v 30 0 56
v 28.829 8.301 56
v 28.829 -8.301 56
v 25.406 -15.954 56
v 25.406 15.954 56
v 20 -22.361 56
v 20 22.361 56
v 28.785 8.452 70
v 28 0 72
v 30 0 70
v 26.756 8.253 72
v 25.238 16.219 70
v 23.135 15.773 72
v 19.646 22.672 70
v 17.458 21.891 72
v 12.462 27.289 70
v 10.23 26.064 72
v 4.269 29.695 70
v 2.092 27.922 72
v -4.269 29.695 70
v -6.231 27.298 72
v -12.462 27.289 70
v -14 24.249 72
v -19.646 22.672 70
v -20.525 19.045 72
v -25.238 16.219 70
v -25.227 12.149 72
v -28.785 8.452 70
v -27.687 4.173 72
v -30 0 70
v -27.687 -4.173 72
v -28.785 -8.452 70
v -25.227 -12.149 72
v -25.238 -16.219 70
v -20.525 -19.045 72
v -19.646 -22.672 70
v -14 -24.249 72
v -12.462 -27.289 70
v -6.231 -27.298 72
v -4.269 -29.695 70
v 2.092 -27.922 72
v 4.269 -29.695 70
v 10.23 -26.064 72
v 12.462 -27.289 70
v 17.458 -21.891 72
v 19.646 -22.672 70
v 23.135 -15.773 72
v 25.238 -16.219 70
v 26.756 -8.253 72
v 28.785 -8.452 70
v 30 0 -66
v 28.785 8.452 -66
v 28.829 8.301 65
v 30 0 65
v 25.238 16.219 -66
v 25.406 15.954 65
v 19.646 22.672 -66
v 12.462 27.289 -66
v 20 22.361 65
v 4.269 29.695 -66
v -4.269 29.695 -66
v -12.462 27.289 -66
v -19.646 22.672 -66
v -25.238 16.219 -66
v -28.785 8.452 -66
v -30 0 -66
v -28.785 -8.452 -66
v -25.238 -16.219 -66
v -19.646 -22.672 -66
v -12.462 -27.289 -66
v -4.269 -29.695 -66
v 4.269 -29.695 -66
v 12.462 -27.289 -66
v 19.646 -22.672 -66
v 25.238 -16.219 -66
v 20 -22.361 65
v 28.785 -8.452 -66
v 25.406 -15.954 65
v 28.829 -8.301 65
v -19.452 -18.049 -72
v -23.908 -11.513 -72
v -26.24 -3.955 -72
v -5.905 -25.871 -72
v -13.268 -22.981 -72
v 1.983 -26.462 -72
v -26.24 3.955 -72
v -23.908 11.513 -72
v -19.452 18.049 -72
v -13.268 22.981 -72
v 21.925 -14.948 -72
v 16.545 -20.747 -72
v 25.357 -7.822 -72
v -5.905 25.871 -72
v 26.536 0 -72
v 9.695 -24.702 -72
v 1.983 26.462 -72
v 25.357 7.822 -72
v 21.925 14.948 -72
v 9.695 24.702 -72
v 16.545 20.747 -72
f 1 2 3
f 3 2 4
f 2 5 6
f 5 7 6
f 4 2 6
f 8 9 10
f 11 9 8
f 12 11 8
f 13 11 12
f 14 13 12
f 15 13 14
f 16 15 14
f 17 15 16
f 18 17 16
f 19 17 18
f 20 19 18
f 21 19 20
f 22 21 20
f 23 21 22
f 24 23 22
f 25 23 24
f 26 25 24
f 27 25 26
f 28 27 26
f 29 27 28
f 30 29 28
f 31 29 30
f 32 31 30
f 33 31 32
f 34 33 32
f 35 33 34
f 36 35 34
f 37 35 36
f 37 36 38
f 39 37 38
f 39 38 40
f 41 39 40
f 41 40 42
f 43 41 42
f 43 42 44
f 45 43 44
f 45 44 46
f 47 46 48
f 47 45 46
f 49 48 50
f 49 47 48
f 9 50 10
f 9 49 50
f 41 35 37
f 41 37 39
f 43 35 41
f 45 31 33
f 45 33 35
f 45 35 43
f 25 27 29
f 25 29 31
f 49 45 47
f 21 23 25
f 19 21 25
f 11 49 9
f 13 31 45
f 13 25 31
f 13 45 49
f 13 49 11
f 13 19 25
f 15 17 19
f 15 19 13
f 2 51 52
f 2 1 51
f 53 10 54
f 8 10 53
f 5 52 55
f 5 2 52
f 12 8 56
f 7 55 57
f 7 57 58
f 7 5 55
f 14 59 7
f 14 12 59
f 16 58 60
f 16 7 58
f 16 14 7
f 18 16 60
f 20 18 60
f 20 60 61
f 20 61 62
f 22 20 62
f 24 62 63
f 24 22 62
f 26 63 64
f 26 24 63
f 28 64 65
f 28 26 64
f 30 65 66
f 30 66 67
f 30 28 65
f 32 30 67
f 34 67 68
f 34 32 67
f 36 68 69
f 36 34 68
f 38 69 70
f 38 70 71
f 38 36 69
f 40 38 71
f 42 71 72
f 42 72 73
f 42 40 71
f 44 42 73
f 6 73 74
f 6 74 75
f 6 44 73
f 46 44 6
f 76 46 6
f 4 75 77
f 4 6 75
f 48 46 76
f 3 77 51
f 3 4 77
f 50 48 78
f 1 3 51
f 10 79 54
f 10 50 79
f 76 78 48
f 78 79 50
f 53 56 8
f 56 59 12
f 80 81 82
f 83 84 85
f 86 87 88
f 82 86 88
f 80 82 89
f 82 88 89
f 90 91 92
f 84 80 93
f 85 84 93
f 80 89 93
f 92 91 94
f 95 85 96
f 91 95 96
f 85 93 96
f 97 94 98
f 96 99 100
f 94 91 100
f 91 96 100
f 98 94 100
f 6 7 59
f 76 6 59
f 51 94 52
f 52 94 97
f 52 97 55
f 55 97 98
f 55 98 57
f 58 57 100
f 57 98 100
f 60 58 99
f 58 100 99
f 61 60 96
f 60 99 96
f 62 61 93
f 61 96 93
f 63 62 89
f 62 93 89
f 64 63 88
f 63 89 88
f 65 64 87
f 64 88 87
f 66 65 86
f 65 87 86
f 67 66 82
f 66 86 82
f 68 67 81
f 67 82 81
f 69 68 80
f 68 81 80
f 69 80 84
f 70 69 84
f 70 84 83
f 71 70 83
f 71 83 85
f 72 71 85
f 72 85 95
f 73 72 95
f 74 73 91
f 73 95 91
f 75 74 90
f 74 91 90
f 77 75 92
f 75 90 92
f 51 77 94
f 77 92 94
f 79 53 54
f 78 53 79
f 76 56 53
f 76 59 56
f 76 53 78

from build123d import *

# Parameters (mm, degrees)
F0_R     = 30
F1_DEPTH = 72
F2_SIZE  = 2
F3_SIZE2 = 3.464102
F3_SIZE  = 6
F4_W     = 15
F4_H     = 9
F5_DEPTH = 50


with BuildPart() as f1:
    # F0 (on Top) → F1 (new body, symmetric)
    with BuildSketch(Plane.XY):
        Circle(F0_R)
    extrude(amount=F1_DEPTH, both=True)

    # F2
    f2_edges = [f1.edges().sort_by_distance(p)[0] for p in [
        (-30, 0, 72),
    ]]
    chamfer(f2_edges, length=F2_SIZE)

    # F3
    f3_edges = [f1.edges().sort_by_distance(p)[0] for p in [
        (-30, 0, -72),
    ]]
    chamfer(f3_edges, length=F3_SIZE, length2=F3_SIZE2)

    # F4 (on Front) → F5 (cut, symmetric)
    with BuildSketch(Plane.XZ):
        with Locations((27.5, 60.5)):
            Rectangle(F4_W, F4_H)
    extrude(amount=F5_DEPTH, both=True, mode=Mode.SUBTRACT)


solid = f1.part
